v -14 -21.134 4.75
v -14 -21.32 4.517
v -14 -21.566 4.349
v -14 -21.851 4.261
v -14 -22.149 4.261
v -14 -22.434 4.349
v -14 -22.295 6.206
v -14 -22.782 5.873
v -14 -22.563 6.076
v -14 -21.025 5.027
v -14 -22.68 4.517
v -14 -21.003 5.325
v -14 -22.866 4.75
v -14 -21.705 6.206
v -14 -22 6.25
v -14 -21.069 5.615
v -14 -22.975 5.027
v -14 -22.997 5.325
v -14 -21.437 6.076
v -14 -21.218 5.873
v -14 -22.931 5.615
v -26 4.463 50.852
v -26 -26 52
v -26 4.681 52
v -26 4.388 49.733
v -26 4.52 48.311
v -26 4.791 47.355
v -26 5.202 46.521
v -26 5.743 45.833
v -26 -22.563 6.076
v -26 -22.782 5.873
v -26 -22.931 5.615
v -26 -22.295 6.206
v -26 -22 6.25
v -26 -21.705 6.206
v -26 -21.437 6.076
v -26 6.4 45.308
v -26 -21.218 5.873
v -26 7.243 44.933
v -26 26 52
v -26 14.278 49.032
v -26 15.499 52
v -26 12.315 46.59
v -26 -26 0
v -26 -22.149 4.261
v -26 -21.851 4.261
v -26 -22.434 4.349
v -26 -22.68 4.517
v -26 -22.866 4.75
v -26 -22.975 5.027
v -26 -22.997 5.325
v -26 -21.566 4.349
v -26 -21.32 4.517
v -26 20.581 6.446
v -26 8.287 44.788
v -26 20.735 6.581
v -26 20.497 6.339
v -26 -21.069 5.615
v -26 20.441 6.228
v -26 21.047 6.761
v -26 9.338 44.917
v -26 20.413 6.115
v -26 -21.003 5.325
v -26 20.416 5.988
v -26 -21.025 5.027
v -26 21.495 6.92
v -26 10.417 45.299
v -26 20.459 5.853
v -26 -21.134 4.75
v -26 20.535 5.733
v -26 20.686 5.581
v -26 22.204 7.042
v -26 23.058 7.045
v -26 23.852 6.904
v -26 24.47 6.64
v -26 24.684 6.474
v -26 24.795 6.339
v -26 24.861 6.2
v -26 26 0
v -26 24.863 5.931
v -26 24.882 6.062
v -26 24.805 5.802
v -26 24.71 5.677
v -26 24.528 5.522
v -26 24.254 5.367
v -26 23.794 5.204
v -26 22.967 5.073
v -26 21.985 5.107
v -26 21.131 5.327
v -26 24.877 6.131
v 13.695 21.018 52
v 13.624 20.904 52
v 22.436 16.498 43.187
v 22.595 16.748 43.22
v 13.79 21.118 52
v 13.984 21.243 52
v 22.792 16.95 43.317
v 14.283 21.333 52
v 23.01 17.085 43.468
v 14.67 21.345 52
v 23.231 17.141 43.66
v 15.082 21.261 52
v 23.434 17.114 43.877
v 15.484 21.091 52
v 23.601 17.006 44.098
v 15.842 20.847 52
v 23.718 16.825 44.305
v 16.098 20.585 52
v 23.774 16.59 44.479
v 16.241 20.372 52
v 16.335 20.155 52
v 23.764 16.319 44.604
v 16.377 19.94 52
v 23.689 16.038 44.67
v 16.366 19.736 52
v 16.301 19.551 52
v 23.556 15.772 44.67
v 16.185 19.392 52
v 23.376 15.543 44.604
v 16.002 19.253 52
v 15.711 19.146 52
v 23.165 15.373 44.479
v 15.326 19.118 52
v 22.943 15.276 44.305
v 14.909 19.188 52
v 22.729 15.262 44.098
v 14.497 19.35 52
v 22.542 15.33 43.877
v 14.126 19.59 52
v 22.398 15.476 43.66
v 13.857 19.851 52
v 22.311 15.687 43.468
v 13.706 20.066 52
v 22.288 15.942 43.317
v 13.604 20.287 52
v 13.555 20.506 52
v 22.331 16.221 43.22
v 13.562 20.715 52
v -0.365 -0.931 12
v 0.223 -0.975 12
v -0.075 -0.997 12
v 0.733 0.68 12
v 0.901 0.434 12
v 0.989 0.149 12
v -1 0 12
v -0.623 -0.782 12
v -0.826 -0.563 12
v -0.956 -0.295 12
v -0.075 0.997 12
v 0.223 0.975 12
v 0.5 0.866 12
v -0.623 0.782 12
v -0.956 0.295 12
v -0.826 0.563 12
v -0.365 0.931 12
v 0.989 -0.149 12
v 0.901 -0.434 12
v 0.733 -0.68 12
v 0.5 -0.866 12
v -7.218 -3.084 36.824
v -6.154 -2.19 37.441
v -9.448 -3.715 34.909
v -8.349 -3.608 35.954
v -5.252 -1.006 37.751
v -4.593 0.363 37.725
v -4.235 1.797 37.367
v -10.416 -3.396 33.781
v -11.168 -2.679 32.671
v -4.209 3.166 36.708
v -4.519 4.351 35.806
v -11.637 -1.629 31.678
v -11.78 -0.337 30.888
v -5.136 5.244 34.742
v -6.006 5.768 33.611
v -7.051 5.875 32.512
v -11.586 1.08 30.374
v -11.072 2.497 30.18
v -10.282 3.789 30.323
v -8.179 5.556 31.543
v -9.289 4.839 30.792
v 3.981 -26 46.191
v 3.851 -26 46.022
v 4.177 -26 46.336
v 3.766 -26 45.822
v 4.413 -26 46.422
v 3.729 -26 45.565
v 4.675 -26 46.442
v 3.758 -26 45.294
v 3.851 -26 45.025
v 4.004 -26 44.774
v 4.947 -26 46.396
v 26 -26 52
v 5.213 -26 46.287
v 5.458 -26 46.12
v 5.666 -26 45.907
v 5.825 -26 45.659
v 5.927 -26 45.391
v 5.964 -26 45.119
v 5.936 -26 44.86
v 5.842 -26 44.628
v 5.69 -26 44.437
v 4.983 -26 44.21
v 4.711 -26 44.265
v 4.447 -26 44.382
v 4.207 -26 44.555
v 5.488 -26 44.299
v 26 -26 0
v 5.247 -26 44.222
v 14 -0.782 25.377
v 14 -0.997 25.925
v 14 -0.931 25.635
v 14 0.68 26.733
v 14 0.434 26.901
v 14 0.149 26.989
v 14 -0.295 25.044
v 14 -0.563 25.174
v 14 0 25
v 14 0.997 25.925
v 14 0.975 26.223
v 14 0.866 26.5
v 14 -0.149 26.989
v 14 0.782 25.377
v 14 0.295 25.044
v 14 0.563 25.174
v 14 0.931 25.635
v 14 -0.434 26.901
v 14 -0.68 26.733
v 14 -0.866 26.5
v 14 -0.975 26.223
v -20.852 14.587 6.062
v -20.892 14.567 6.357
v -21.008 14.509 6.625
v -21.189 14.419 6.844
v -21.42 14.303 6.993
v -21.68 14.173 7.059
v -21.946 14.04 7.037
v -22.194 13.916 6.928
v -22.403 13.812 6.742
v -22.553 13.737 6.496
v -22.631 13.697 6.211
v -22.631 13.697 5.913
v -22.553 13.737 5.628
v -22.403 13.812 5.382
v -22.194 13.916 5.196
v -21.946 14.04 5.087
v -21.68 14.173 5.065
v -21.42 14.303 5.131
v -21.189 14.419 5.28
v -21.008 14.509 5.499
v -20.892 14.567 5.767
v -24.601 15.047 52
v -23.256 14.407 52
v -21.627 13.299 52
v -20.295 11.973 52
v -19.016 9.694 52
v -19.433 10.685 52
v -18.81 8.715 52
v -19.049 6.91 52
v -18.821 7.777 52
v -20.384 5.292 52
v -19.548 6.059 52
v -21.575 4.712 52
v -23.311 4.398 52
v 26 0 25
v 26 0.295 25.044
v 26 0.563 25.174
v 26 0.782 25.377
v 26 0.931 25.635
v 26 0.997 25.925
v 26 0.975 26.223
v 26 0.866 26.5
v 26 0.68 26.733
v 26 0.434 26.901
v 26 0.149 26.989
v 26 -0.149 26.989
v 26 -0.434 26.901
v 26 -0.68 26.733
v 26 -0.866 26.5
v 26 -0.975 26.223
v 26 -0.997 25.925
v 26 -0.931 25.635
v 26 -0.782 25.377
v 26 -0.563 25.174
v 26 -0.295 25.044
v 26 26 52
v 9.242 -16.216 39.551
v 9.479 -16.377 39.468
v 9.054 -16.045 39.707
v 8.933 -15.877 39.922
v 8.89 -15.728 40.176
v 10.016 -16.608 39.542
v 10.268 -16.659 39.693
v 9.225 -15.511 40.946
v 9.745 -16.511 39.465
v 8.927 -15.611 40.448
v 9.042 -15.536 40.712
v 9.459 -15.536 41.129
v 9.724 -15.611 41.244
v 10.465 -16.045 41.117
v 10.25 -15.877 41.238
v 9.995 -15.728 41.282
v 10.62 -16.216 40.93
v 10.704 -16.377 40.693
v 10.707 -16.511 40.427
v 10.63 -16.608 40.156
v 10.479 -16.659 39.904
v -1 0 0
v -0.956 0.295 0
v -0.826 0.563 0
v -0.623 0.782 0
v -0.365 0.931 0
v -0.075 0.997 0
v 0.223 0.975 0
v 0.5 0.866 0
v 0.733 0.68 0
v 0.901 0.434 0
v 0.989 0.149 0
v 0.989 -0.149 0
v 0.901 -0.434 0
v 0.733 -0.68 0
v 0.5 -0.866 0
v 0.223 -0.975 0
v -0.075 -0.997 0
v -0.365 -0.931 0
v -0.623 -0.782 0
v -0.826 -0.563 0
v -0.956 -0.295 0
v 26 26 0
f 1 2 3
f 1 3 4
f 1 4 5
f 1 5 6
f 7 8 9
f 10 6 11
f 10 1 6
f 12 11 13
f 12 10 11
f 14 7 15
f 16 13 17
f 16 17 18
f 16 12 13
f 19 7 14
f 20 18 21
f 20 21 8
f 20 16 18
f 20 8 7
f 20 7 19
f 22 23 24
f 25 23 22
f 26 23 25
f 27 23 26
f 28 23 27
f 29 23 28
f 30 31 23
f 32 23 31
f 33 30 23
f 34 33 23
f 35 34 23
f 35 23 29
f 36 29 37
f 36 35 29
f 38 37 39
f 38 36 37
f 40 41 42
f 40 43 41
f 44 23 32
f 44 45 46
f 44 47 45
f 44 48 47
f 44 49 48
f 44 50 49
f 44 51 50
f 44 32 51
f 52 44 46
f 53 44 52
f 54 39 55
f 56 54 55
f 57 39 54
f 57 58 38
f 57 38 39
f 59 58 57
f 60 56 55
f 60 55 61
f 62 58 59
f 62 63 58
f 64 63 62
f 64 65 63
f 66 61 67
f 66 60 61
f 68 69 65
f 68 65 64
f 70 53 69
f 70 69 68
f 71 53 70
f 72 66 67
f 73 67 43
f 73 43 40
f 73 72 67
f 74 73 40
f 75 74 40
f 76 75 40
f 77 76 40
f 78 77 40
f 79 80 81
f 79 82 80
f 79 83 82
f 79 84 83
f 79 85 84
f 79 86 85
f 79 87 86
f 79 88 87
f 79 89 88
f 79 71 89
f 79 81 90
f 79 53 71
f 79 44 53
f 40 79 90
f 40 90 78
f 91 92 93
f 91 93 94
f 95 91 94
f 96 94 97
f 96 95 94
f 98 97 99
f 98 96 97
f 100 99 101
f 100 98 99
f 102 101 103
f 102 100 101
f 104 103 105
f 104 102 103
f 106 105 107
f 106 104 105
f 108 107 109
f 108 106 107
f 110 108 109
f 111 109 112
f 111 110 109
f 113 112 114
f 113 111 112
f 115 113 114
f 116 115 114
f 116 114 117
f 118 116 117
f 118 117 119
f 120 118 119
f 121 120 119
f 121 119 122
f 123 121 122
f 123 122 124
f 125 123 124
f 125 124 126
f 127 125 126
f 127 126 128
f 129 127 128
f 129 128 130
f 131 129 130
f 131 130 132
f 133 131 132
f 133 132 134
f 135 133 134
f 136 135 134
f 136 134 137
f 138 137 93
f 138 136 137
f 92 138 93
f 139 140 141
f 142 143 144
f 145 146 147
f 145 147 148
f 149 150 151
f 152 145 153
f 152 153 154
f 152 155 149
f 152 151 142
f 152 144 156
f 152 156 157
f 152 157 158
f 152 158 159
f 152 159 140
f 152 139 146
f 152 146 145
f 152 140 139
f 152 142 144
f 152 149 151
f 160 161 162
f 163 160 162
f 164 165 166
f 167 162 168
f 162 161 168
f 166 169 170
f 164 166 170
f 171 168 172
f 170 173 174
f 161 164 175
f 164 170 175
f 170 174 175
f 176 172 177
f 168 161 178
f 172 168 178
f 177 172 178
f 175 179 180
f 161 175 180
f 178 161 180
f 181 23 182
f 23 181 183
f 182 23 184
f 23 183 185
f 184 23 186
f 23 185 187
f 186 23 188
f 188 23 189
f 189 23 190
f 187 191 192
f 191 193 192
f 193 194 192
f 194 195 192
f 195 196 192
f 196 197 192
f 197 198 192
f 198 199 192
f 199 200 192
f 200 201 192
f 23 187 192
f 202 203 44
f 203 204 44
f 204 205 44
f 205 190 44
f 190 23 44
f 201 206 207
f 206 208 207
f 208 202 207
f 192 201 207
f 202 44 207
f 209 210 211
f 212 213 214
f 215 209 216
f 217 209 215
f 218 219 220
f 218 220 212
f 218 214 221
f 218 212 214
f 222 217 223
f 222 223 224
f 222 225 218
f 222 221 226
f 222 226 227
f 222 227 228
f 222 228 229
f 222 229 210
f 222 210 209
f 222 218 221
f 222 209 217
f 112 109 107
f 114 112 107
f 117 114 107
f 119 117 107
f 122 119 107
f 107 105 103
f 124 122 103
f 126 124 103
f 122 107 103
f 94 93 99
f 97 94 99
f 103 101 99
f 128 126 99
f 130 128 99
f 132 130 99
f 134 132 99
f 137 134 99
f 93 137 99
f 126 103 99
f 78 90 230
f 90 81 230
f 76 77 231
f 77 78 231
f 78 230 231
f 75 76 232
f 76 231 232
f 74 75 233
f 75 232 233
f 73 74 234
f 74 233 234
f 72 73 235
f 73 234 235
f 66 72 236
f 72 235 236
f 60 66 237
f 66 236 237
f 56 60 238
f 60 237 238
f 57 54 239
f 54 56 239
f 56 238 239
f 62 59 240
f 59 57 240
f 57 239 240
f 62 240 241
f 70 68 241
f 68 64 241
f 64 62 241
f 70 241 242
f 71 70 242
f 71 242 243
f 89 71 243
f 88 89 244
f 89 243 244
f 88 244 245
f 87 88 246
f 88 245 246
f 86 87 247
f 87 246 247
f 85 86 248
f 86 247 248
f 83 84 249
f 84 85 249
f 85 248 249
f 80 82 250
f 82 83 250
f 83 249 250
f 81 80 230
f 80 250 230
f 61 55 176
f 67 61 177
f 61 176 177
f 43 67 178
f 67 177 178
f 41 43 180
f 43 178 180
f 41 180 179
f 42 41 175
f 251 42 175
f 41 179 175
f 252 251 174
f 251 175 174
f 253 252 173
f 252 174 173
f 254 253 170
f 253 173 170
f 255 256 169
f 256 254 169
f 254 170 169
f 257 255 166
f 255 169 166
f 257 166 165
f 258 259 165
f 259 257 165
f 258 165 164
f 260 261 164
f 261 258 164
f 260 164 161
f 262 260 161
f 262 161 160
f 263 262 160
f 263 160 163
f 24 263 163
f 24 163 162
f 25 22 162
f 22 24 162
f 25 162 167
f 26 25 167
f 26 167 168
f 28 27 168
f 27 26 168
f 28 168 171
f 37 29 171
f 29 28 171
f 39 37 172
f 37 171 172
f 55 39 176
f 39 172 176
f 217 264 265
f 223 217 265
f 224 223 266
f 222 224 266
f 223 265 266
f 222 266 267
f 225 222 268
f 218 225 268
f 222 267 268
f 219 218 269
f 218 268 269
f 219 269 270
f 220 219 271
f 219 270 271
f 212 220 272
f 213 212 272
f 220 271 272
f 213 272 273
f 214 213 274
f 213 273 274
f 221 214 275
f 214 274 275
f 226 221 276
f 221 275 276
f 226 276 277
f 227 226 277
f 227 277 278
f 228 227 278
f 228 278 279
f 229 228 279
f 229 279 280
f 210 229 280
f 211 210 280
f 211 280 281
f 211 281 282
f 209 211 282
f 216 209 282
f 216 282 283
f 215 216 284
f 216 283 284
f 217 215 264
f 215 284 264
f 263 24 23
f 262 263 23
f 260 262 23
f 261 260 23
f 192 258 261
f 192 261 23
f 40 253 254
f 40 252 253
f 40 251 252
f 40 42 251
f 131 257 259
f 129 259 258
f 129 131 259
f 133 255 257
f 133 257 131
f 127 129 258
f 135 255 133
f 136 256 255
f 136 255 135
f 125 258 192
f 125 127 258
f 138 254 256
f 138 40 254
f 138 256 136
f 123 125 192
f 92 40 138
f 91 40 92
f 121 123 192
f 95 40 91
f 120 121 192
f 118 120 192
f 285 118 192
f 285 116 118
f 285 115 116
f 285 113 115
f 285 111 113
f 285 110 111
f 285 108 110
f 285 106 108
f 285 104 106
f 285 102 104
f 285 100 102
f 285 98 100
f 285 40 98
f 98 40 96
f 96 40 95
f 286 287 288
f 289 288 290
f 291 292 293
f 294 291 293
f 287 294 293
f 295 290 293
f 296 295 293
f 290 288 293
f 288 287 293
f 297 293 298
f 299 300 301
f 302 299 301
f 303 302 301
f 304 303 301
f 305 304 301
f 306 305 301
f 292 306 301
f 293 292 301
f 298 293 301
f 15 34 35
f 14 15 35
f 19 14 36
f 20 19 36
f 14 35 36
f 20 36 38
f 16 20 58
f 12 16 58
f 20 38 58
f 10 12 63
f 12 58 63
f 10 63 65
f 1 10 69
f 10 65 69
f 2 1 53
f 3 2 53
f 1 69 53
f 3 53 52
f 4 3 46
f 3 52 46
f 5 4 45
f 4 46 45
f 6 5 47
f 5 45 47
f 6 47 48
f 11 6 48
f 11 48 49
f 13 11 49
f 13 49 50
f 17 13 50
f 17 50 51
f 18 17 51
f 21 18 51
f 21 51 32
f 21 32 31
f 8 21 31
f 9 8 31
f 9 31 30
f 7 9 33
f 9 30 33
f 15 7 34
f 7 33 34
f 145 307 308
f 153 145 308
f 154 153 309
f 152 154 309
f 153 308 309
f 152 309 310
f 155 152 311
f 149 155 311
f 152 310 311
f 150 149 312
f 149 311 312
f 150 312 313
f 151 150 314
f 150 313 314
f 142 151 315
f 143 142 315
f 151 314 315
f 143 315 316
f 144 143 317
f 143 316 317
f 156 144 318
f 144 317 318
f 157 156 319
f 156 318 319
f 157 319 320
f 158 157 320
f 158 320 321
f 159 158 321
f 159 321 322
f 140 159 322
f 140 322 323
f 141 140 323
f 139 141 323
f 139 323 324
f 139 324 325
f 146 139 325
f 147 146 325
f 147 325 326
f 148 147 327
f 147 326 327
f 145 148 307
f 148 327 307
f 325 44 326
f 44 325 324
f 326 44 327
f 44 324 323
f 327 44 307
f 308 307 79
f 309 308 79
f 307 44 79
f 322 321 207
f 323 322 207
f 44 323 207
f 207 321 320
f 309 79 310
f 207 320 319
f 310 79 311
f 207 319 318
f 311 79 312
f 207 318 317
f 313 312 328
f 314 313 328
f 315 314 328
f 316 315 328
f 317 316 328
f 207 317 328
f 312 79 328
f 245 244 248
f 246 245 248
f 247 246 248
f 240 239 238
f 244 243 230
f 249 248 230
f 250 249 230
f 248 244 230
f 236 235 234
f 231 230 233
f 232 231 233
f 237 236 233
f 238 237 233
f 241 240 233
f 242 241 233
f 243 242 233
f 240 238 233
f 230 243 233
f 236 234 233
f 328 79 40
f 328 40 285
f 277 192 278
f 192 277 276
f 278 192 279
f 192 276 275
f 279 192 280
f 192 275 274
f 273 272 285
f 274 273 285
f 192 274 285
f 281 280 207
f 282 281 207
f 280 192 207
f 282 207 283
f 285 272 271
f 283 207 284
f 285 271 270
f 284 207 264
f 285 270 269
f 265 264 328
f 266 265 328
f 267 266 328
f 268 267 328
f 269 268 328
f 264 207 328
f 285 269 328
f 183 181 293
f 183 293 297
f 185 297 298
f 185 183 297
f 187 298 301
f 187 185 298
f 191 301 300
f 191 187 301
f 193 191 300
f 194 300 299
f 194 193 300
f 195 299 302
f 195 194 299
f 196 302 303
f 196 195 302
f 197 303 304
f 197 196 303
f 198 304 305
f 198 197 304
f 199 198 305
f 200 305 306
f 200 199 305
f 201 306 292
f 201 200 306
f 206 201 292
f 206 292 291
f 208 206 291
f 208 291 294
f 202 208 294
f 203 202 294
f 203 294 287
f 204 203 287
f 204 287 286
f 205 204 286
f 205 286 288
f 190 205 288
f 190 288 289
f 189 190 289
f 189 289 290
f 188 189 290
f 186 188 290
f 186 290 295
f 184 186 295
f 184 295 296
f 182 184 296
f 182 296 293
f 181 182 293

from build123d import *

# Parameters (mm, degrees)
SQUARE_W             = 52
SQUARE_H             = 52
CUBE_EXTRUSION_DEPTH = 52
STICK_CUT_START      = 15
STICK_HOLE_R         = 5.1
STICK_CUT_DEPTH      = 90.048032459
SKETCH1_R            = 1
CUT_EXTRUDE1_DEPTH   = 24
SKETCH2_R            = 1
CUT_EXTRUDE2_DEPTH   = 12
SKETCH6_R            = 1
CUT_EXTRUDE4_DEPTH   = 6
SKETCH7_R            = 1
CUT_EXTRUDE5_DEPTH   = 12
SKETCH8_R            = 1
CUT_EXTRUDE6_DEPTH   = 12
SKETCH11_R           = 1
CUT_EXTRUDE7_DEPTH   = 25


with BuildPart() as part:
    # Square → Cube-Extrusion (new body)
    with BuildSketch(Plane.XY):
        Rectangle(SQUARE_W, SQUARE_H)
    extrude(amount=CUBE_EXTRUSION_DEPTH)

    # Stick-Hole → Stick-Cut (cut, through all)
    with BuildSketch(Plane(origin=(-28.888888889, 14.444444444, 28.888888889), x_dir=(-0.7453559924999299, -0.2981423969999719, -0.596284793999944), z_dir=(0.6666666666666667, -0.3333333333333332, -0.6666666666666667)).offset(STICK_CUT_START)):
        with Locations(Location((-14.635839315, -14.230249471, 0), (0, 0, 18.434948823))):
            Circle(STICK_HOLE_R)
    extrude(amount=-STICK_CUT_DEPTH, mode=Mode.SUBTRACT)

    # Sketch1 → Cut-Extrude1 (cut)
    with BuildSketch(Plane(origin=(-28.888888889, 14.444444444, 28.888888889), x_dir=(-0.7453559924999299, -0.2981423969999719, -0.596284793999944), z_dir=(0.6666666666666667, -0.3333333333333332, -0.6666666666666667))):
        with Locations(Location((-48.193677872, -5.157603573, 0), (0, 0, 36.869897646))):
            Circle(SKETCH1_R)
    extrude(amount=CUT_EXTRUDE1_DEPTH, mode=Mode.SUBTRACT)

    # Sketch2 → Cut-Extrude2 (cut)
    with BuildSketch(Plane.ZY.offset(26)):
        with Locations((5.25, -22)):
            Circle(SKETCH2_R)
    extrude(amount=-CUT_EXTRUDE2_DEPTH, mode=Mode.SUBTRACT)

    # Sketch6 → Cut-Extrude4 (cut, symmetric)
    with BuildSketch(Plane(origin=(-12.68854382, 25.37708764, 0), x_dir=(-0.894427190999916, -0.4472135954999577, 0), z_dir=(0.4472135954999577, -0.894427190999916, 0))):
        with Locations(Location((13.127553483, -6.062116333, 0), (0, 0, 180))):
            Circle(SKETCH6_R)
    extrude(amount=CUT_EXTRUDE4_DEPTH, both=True, mode=Mode.SUBTRACT)

    # Sketch7 → Cut-Extrude5 (cut)
    with BuildSketch(Plane(origin=(26, 0, 0), x_dir=(0, 0, -1), z_dir=(1, 0, 0))):
        with Locations((-26, 0)):
            Circle(SKETCH7_R)
    extrude(amount=-CUT_EXTRUDE5_DEPTH, mode=Mode.SUBTRACT)

    # Sketch8 → Cut-Extrude6 (cut)
    with BuildSketch(Plane(origin=(0, 0, 0), x_dir=(-1, 0, 0), z_dir=(0, 0, -1))):
        Circle(SKETCH8_R)
    extrude(amount=-CUT_EXTRUDE6_DEPTH, mode=Mode.SUBTRACT)

    # Sketch11 → Cut-Extrude7 (cut)
    with BuildSketch(Plane(origin=(-20.663264952, -41.326529904, 20.663264952), x_dir=(0.9128709291752769, -0.3651483716701108, 0.18257418583505525), z_dir=(0.4082482904638631, 0.8164965809277261, -0.4082482904638629))):
        with Locations(Location((22.193323836, -28.912405603, 0), (0, 0, 230.768479516))):
            Circle(SKETCH11_R)
    extrude(amount=CUT_EXTRUDE7_DEPTH, mode=Mode.SUBTRACT)


solid = part.part
